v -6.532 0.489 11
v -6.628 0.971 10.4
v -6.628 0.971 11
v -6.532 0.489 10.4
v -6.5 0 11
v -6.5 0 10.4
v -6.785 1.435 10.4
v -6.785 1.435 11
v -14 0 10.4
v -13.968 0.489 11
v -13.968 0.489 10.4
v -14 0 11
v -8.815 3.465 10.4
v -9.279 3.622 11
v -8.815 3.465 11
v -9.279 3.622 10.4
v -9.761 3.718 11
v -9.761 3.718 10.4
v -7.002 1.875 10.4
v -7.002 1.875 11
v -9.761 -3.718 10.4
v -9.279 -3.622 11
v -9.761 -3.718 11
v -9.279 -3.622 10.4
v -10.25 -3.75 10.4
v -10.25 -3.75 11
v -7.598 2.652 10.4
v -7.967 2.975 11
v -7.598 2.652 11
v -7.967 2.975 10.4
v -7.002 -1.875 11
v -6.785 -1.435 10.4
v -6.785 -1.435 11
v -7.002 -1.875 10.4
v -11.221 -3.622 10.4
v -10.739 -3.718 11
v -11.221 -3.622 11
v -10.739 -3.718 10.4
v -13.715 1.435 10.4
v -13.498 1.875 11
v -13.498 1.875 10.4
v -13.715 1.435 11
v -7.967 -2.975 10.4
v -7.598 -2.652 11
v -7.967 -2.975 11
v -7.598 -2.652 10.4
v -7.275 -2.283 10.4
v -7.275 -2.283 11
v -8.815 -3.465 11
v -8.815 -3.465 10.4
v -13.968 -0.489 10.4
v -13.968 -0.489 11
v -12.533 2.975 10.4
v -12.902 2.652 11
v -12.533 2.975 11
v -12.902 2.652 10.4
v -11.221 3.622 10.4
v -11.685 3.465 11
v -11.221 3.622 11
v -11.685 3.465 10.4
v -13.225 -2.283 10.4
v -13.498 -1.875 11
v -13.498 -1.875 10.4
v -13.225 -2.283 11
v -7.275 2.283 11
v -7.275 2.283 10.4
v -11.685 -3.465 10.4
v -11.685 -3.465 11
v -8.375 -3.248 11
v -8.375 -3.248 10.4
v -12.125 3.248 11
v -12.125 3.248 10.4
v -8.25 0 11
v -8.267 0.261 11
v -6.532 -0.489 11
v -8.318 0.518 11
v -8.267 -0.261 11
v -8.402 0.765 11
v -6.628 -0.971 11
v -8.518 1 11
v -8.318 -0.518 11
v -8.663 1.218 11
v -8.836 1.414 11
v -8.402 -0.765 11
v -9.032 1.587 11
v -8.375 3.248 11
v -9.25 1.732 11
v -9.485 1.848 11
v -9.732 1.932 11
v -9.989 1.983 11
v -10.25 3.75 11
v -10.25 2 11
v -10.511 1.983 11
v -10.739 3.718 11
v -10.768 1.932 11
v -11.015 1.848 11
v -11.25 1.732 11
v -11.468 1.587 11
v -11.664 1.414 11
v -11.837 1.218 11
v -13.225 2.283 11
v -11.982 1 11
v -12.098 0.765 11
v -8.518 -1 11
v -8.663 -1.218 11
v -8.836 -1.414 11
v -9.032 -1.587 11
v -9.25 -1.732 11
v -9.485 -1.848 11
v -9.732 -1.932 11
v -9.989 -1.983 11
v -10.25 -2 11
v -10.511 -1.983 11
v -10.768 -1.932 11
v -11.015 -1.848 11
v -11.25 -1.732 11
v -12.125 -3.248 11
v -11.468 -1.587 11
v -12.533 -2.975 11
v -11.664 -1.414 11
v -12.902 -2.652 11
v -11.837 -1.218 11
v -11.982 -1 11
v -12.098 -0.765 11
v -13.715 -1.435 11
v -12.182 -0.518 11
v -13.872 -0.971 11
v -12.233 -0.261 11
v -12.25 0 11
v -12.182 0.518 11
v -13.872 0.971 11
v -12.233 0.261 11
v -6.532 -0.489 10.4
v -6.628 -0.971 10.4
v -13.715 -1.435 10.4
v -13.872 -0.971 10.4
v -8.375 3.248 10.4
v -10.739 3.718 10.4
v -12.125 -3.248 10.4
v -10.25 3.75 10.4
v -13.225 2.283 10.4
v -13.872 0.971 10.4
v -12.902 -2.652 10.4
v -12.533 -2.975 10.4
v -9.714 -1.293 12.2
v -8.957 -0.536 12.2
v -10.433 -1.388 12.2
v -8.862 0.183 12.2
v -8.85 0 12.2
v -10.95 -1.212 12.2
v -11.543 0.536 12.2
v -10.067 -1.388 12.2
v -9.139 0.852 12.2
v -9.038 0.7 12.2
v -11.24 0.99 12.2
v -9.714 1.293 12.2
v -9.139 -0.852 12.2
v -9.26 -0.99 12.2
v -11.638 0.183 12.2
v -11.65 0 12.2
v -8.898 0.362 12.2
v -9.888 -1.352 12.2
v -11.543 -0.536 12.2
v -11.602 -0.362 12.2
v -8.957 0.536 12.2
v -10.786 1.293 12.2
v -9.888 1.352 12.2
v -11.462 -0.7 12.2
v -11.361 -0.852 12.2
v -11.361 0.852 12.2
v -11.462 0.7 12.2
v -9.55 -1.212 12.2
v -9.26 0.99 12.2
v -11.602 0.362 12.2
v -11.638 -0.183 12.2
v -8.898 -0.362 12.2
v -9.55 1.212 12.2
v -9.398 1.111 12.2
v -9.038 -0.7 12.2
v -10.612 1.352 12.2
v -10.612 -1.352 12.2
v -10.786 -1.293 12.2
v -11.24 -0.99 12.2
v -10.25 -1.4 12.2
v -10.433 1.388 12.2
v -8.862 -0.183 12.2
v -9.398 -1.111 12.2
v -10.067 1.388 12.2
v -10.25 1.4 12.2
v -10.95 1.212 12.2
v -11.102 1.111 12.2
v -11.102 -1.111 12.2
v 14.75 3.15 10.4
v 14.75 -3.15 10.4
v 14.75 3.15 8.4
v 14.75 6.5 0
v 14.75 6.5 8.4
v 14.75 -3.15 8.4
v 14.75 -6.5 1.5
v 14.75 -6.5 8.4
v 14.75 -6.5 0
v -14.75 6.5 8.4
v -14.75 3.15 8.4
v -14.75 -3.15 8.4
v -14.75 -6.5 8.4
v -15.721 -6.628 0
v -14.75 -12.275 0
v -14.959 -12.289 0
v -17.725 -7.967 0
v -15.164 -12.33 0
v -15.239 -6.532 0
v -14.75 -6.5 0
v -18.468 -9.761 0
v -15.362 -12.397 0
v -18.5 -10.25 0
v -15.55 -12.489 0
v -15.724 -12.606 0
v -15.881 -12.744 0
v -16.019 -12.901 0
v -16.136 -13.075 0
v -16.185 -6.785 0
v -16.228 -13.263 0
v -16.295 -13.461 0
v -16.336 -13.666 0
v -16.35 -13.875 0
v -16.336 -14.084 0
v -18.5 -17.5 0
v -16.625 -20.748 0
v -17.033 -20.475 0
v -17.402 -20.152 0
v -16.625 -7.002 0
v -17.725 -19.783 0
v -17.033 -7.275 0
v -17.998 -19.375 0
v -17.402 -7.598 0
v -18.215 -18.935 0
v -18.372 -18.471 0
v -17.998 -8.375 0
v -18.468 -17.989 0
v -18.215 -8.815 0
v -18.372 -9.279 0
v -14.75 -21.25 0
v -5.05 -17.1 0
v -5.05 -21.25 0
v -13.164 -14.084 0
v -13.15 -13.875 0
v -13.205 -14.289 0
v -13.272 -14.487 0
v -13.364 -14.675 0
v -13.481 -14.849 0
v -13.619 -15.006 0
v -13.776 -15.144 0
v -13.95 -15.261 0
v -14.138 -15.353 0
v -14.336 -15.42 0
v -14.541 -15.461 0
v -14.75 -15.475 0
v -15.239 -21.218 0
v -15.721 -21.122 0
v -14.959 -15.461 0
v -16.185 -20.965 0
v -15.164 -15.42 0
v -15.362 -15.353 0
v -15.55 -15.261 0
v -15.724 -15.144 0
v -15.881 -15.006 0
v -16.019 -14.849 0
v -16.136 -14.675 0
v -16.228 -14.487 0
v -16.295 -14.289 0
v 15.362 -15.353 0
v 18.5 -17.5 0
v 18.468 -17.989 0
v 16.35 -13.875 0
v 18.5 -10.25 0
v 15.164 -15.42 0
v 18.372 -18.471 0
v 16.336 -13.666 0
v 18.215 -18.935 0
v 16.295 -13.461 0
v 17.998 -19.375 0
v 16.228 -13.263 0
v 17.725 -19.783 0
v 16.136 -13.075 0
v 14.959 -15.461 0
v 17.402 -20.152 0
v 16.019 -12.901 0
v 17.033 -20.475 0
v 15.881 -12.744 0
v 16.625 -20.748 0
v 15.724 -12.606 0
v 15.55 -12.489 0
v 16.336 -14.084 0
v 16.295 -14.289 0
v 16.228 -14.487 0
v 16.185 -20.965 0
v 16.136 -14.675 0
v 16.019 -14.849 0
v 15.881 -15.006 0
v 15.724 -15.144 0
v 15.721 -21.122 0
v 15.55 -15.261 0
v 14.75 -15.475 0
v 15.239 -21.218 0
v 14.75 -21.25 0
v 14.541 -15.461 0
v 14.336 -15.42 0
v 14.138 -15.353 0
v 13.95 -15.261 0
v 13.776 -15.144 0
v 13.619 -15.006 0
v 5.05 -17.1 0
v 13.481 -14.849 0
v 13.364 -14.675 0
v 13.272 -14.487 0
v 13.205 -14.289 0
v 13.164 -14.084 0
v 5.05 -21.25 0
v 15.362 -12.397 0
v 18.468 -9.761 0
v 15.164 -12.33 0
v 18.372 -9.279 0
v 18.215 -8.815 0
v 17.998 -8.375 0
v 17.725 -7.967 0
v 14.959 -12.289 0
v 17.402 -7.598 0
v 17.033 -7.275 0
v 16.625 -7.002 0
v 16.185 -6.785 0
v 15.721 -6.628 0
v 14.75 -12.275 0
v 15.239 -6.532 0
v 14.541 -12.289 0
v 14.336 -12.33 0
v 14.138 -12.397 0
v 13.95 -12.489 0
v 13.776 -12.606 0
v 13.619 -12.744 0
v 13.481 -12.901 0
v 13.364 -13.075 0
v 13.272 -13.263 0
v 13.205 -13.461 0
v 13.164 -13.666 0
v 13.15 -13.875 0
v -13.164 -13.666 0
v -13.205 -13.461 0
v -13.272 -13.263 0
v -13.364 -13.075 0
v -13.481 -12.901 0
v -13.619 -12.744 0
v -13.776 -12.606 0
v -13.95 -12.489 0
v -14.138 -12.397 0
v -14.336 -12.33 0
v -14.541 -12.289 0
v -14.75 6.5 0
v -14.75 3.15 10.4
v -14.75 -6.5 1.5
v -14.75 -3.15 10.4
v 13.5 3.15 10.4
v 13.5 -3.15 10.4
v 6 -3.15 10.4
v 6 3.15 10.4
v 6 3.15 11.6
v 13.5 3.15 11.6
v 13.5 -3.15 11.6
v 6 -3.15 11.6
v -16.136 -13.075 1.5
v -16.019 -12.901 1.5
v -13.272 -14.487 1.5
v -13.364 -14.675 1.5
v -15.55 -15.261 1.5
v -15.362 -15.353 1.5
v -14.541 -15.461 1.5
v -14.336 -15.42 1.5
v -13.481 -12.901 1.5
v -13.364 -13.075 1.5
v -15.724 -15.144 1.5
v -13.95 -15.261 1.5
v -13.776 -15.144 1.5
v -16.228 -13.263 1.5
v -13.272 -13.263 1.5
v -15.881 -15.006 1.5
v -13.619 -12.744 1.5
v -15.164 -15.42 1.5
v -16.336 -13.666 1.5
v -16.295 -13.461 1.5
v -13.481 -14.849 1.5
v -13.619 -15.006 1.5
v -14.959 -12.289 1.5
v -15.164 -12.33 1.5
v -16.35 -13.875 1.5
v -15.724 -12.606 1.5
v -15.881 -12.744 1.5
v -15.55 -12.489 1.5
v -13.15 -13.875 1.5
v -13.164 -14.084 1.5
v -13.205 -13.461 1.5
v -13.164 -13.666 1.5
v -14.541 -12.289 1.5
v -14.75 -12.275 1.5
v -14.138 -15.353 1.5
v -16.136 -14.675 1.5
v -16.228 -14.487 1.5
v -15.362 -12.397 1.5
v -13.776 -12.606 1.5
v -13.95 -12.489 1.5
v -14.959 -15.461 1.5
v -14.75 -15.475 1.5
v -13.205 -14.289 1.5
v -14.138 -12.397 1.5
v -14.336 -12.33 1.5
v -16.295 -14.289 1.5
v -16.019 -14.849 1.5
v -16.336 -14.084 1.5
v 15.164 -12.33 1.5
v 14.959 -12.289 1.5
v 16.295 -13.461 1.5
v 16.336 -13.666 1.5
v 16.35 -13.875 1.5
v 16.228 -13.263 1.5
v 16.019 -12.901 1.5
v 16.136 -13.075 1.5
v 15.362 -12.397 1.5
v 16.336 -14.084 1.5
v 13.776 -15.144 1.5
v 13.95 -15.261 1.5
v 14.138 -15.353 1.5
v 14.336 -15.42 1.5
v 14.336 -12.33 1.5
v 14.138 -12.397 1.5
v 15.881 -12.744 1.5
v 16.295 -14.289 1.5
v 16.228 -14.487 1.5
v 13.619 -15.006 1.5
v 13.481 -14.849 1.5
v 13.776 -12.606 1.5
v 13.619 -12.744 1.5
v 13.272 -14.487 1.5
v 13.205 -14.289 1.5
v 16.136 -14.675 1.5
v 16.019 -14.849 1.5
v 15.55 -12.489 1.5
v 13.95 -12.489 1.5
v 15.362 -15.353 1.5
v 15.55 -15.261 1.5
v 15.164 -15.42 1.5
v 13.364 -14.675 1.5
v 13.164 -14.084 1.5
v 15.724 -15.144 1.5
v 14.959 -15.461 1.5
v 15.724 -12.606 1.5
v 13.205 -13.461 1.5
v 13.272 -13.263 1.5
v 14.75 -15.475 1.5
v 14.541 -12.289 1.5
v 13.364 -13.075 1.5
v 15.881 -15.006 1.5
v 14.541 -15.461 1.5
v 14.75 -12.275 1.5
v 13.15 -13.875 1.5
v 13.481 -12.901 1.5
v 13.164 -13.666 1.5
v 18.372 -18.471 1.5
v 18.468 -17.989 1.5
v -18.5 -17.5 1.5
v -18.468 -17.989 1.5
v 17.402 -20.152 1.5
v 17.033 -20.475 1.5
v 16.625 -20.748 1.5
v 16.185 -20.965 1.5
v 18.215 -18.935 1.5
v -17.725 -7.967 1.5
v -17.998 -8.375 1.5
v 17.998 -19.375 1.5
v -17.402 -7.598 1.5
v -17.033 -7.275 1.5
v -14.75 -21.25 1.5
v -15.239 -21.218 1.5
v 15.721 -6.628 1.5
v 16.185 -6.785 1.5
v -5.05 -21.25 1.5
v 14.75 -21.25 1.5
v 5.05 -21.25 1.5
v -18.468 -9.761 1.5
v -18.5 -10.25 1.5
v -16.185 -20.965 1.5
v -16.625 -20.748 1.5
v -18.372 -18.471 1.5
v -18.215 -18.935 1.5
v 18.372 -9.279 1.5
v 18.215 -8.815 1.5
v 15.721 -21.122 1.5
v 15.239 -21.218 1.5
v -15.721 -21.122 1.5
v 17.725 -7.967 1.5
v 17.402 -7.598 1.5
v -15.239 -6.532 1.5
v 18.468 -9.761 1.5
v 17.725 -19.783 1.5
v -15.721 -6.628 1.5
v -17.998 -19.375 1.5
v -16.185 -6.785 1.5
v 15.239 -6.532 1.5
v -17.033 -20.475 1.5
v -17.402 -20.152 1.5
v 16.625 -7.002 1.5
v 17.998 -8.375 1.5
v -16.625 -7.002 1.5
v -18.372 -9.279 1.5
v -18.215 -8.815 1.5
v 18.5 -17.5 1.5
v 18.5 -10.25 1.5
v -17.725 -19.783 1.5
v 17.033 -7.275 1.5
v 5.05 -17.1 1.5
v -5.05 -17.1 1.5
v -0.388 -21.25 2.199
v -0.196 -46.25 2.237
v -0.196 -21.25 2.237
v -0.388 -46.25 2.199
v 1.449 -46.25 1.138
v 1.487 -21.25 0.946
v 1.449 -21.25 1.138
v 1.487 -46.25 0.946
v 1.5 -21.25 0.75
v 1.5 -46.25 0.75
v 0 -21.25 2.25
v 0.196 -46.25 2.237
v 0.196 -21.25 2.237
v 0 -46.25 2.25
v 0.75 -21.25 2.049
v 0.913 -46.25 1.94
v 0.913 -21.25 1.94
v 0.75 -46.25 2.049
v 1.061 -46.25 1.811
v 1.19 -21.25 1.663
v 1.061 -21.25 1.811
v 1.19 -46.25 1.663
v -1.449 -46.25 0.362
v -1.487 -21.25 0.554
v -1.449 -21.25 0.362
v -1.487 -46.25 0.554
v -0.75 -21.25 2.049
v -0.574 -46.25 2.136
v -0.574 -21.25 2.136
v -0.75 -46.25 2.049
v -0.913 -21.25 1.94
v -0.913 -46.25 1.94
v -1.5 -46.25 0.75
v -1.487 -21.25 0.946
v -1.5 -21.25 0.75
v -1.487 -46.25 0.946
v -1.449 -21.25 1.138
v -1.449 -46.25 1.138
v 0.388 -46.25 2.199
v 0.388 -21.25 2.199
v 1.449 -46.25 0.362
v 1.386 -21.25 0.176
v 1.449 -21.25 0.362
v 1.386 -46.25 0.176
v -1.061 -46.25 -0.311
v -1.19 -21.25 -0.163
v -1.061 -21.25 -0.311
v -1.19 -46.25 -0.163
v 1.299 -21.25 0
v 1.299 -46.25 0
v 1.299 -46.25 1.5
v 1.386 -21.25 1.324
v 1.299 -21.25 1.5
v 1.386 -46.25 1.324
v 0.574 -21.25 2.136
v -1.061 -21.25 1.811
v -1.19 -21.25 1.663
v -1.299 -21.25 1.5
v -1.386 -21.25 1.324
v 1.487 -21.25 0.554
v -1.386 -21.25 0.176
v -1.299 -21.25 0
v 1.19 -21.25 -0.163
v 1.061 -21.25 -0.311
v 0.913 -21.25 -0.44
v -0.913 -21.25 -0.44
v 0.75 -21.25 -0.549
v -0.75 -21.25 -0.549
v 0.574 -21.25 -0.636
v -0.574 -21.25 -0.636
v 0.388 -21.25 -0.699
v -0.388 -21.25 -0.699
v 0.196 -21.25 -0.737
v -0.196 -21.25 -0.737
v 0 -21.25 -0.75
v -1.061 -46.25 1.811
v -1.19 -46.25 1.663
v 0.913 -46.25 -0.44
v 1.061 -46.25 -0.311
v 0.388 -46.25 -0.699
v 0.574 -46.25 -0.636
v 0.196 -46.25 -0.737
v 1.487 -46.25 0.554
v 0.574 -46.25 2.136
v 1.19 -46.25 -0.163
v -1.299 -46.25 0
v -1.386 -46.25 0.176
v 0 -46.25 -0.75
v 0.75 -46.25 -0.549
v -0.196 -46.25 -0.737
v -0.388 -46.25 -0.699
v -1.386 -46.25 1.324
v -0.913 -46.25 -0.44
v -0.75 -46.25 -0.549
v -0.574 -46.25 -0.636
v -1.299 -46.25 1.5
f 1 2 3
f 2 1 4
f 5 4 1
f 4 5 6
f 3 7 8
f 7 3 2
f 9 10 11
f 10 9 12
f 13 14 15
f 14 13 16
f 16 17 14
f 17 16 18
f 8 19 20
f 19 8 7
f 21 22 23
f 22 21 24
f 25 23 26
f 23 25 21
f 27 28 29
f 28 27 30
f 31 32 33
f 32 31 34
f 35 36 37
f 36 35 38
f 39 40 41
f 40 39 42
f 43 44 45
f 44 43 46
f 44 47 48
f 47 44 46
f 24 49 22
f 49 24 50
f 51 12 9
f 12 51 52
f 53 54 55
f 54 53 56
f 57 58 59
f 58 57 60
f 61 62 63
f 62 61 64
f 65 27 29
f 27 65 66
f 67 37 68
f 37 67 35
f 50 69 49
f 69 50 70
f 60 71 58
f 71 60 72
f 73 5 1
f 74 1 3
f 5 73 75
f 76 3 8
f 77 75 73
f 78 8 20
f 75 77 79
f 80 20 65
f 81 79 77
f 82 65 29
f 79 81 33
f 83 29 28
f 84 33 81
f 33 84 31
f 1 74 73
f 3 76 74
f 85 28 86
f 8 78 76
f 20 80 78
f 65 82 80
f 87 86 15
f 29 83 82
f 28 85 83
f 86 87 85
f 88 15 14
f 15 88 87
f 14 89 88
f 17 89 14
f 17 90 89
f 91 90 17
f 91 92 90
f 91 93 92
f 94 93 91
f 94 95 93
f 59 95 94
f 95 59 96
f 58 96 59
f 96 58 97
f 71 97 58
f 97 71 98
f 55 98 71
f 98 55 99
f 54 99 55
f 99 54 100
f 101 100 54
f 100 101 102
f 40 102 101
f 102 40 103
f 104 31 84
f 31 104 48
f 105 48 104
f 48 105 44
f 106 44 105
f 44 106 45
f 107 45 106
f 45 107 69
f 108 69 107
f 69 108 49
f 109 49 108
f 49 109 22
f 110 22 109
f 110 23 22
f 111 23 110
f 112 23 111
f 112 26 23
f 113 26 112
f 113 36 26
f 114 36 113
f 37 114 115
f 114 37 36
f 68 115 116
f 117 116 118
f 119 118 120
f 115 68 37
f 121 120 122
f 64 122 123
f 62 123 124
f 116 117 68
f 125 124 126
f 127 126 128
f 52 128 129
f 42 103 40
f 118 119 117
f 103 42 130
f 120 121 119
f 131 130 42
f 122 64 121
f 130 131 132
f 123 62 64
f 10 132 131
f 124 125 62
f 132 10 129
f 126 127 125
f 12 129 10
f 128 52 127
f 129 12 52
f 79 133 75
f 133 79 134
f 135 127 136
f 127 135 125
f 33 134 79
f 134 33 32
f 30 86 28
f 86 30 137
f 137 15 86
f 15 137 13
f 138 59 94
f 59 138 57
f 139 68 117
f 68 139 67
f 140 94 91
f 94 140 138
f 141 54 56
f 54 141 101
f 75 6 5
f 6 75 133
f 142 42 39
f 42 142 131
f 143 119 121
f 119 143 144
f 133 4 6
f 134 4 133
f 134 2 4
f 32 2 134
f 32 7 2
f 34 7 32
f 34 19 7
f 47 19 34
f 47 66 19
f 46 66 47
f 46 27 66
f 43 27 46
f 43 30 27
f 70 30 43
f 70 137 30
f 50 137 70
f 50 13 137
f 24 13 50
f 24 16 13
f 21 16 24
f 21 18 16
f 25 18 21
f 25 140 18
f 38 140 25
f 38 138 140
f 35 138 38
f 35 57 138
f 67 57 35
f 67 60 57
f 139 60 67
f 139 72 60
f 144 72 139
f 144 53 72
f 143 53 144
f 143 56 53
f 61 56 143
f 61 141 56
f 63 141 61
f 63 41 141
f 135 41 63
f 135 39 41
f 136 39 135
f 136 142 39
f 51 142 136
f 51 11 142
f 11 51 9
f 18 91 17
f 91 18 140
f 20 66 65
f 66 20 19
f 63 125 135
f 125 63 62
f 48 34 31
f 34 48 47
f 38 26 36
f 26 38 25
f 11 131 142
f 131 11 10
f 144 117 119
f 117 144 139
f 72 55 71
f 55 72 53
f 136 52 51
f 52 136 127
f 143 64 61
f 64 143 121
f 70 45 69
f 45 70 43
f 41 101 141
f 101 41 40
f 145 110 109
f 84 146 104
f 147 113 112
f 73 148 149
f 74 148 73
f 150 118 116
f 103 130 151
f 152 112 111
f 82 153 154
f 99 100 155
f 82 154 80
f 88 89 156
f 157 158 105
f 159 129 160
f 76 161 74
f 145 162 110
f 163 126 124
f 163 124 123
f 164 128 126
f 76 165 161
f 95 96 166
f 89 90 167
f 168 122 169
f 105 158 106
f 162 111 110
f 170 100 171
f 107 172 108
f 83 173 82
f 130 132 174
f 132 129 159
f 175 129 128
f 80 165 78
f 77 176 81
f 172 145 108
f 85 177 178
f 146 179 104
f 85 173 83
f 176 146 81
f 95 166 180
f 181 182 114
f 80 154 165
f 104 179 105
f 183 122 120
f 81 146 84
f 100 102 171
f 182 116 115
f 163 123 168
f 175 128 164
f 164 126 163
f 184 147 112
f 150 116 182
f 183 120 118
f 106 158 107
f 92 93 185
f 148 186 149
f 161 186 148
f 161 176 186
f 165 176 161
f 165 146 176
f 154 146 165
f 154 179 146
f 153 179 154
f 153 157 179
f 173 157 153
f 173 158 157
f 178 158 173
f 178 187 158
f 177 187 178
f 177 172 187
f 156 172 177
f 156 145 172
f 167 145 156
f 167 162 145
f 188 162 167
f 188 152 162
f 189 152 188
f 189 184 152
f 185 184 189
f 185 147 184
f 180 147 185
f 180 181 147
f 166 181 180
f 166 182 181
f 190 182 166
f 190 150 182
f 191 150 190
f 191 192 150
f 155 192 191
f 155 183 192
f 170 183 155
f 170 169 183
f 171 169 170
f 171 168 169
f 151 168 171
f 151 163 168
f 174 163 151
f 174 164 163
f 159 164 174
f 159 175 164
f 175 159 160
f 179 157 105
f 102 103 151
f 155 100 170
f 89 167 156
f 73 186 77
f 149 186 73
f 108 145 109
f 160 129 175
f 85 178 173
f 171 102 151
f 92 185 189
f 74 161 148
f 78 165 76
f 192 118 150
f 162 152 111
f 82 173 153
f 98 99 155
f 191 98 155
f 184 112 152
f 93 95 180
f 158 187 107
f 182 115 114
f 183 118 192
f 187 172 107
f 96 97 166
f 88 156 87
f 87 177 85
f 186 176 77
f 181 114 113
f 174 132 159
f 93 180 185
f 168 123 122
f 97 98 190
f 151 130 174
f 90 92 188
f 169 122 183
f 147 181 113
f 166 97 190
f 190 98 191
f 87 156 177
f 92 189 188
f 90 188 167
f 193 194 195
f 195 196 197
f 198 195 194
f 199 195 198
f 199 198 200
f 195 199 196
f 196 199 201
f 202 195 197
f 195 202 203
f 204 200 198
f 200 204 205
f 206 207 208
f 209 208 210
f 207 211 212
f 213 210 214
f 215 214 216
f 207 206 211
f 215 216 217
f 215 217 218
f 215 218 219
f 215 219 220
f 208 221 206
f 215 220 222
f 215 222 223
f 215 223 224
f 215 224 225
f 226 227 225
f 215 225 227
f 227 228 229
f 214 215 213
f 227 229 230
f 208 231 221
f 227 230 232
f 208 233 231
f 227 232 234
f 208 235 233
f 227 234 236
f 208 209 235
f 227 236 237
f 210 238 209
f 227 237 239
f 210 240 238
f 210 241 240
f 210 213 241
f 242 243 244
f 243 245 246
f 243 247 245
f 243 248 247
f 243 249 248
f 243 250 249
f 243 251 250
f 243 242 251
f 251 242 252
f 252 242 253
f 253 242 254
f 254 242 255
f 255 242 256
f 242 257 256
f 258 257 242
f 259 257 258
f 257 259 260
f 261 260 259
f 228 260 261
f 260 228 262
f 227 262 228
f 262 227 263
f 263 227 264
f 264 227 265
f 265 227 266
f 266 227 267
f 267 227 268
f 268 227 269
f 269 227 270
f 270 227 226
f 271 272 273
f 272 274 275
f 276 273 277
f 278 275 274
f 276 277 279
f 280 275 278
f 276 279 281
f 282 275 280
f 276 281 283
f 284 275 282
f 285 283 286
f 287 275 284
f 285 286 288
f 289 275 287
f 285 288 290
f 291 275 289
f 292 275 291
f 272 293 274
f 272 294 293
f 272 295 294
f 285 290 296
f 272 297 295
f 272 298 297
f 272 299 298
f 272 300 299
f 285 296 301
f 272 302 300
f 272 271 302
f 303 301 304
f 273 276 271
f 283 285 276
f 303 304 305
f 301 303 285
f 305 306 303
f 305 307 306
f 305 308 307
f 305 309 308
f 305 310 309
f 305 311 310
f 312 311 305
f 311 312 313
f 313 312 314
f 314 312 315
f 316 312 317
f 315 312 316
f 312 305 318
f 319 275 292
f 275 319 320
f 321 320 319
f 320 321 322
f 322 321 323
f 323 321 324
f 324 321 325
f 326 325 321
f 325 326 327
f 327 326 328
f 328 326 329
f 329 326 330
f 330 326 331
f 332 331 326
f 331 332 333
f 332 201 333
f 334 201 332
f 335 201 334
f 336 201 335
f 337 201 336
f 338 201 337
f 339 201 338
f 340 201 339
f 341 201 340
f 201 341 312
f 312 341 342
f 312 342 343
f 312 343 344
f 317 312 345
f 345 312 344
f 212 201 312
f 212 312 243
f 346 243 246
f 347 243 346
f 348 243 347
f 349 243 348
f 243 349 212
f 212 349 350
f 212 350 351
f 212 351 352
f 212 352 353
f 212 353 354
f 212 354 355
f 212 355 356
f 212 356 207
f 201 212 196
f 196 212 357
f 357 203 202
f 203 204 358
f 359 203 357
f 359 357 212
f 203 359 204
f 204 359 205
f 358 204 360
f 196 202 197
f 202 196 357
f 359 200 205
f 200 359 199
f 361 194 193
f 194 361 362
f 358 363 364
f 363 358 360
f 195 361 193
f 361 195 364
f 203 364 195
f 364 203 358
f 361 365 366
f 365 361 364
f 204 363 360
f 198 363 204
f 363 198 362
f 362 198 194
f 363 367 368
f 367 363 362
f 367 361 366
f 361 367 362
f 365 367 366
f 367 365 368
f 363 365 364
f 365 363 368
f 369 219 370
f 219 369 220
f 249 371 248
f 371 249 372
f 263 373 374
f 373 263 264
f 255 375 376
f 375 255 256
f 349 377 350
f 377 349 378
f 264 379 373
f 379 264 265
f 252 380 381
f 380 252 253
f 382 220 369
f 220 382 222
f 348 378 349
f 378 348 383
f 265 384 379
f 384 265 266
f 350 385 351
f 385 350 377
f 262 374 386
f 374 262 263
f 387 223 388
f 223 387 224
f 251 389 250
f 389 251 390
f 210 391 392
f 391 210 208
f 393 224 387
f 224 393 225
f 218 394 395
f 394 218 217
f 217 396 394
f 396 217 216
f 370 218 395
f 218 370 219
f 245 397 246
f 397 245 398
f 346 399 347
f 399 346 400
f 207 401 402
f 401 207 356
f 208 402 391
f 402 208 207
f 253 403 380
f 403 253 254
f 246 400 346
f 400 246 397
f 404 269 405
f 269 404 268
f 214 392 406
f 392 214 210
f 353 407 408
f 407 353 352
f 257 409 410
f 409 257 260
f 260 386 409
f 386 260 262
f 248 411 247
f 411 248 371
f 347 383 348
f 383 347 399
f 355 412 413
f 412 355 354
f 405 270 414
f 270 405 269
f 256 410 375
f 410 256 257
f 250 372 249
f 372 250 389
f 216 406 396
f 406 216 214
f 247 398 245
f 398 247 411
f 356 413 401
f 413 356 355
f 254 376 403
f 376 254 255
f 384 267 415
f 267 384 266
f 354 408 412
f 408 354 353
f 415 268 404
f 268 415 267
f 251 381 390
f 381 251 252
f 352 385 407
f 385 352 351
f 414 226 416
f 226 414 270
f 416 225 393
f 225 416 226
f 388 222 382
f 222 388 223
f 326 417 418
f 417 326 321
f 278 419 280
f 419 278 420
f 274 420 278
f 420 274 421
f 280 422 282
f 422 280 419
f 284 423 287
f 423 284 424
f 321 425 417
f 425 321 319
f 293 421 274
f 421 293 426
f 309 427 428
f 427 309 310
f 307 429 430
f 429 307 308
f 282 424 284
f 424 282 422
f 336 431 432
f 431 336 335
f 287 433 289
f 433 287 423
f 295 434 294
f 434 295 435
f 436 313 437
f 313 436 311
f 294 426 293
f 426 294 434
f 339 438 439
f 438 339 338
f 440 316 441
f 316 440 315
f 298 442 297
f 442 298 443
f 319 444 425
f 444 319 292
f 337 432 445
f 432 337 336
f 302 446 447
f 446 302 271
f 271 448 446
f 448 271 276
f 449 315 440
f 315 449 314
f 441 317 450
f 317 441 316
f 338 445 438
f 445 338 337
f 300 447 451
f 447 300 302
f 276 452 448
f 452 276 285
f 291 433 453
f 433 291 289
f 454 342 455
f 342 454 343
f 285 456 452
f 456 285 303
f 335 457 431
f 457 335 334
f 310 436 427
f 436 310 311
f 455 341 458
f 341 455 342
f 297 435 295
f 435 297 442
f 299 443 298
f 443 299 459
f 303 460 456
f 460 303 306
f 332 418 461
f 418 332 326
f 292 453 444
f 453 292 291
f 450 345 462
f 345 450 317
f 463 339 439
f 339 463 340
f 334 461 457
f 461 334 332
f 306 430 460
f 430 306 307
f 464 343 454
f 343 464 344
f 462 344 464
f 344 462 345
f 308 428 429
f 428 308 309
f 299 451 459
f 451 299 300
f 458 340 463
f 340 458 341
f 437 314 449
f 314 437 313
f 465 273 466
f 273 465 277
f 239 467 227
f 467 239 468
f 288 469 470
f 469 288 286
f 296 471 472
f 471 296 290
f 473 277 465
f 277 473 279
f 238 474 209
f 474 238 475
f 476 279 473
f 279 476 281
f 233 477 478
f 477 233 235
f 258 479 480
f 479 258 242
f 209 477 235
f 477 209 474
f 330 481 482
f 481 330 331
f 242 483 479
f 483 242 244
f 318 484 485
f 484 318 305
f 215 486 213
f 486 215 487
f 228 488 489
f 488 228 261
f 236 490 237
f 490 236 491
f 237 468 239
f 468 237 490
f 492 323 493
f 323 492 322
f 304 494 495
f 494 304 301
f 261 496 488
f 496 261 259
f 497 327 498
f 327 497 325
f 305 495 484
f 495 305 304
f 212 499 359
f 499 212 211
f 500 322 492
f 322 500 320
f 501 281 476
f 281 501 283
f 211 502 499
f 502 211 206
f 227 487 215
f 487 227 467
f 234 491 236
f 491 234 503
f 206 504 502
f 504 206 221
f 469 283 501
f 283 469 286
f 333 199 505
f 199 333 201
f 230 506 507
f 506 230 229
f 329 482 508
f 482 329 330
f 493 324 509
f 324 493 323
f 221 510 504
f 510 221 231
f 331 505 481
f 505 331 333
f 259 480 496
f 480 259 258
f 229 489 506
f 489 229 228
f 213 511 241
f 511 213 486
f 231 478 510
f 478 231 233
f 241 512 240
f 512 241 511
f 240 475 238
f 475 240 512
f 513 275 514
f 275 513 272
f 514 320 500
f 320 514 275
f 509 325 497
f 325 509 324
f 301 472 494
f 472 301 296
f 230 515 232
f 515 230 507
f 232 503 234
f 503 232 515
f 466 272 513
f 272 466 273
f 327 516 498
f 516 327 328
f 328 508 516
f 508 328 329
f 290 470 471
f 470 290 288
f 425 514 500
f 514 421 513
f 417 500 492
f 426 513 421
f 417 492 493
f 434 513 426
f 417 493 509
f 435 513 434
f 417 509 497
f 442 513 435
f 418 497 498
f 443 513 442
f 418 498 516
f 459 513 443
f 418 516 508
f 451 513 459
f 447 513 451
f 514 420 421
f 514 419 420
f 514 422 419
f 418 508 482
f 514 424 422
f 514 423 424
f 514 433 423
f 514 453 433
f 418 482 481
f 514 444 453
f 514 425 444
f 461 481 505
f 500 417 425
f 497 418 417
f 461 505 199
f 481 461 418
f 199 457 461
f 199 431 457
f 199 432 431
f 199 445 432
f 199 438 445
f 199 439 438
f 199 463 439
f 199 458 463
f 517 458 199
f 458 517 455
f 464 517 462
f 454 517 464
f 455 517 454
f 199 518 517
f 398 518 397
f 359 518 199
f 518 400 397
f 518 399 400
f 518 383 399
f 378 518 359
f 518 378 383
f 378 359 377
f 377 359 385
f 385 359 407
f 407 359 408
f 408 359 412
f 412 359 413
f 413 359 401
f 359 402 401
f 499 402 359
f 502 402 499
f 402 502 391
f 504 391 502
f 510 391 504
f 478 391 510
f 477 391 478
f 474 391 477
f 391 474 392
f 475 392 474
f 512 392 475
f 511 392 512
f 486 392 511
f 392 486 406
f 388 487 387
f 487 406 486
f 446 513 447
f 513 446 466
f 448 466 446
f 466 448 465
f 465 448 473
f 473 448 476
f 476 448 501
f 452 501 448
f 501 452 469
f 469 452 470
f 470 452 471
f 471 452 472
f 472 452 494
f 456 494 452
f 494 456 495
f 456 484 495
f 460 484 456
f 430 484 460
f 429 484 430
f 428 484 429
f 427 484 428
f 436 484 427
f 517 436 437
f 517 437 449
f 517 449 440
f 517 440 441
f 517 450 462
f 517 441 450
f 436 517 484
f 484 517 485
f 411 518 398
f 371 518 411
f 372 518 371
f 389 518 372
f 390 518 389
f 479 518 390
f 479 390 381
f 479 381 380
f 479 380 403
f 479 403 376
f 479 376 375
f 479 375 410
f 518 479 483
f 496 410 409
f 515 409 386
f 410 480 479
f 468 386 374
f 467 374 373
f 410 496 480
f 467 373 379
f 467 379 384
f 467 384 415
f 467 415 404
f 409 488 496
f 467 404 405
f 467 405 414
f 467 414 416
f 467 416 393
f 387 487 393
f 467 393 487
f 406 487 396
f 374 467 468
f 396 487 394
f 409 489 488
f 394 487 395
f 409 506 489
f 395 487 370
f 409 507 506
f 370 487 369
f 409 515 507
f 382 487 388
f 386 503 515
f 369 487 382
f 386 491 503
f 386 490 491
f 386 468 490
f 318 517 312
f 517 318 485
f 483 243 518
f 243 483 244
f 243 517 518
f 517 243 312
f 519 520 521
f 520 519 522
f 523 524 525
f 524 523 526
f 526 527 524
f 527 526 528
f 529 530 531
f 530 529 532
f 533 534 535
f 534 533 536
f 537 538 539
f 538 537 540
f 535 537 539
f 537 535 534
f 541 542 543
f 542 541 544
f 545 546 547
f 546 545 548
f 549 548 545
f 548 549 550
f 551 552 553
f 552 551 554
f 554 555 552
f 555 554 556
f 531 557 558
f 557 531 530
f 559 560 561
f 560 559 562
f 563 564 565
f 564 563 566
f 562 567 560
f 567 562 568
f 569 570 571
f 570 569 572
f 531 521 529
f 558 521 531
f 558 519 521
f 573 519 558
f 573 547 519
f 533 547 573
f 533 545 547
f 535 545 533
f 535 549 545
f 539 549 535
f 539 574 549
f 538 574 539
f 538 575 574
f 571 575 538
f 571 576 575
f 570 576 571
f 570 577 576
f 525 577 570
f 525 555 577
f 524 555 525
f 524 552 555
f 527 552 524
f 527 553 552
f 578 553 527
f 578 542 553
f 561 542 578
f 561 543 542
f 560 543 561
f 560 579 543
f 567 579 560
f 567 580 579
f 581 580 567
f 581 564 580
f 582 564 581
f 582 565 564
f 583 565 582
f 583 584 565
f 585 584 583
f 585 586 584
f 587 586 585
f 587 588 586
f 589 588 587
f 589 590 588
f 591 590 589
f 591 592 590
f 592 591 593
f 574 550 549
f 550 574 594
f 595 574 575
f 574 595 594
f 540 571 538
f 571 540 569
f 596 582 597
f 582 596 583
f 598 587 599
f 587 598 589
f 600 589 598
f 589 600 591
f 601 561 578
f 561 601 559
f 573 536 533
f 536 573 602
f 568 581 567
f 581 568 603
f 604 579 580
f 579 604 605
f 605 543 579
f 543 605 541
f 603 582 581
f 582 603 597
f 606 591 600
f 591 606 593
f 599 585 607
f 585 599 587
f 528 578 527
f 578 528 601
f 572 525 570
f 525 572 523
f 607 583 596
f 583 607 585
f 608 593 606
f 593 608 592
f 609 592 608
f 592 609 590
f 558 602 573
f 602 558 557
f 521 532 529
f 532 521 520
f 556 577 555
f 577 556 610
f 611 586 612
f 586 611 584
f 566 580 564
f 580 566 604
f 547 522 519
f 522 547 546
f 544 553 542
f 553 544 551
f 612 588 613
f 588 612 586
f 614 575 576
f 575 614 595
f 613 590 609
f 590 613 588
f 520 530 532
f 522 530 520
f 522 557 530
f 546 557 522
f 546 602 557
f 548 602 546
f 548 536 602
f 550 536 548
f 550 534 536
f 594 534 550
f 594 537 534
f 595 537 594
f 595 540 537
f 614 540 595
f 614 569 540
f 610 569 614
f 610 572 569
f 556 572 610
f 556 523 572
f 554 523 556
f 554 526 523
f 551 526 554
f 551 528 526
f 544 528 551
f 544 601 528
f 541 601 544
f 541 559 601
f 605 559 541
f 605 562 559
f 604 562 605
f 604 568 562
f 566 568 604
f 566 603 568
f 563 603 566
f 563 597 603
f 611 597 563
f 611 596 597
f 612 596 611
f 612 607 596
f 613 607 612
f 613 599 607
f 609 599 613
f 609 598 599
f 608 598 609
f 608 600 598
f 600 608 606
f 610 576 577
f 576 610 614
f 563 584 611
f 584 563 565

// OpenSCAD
// ============================================================
// SHARP GP2Y0A21YK0F  距離センサ 外形モデル (近似)
// データシート 2 ページ目 "Outline Dimensions" を基にモデリング
// 単位: mm  /  座標系: 中心が原点, +Z 上方向(レンズ上面), +Y 前方
// 未指定寸法許容差 ±0.3mm (本モデルでは考慮せず概形のみ表現)
// ============================================================

$fn = 48;

// ------- データシート記載値 -------
overall_w      = 37;      // 本体+取付耳 全幅
lens_block_w   = 29.5;    // レンズケース部 幅
ear_w          = (overall_w - lens_block_w) / 2; // 3.75 (取付耳の張り出し)
lens_block_d   = 13;      // レンズケース部 奥行(側面図 13 を奥行に割当)
lens_block_h   = 8.4;     // レンズケース部 高さ(リブ手前まで)

ridge_d        = 6.3;     // 上部レンズ収容リブ 奥行
ridge_h        = 2;       // 上部レンズ収容リブ 高さ

tab_r          = 3.75;    // 取付耳 丸め半径 (R3.75)
hole_d         = 3.2;     // 取付穴 直径 (φ3.2 x2)

emitter_x      = -14.75 + 4.5;    // *4.5  -> -10.25 (発光レンズ中心)
detector_x     = emitter_x + 20;  // *20±0.1 -> 9.75 (受光レンズ中心)

emitter_bezel_r = 3.75;   // 発光レンズ外枠半径 (R3.75)
emitter_lens_r  = 2.0;    // 発光レンズ ドーム半径
detector_w      = 7.5;    // 受光レンズ窓 幅(近似)
detector_d      = 6.3;    // 受光レンズ窓 奥行(リブ幅に合わせる)

bar_extra_d    = 14.75;   // 連結バー 延長長さ(近似)
bar_h          = 1.5;     // 連結バー(薄板)厚み ("2-1.5" のステップ相当)
notch_w        = 10.1;    // ケーブル取り出し切欠き 幅
notch_d        = 4.15;    // ケーブル取り出し切欠き 深さ

cable_r        = 1.5;     // 簡易ケーブル 半径
cable_len      = 25;      // 簡易ケーブル 長さ

// ------- 派生位置 -------
lens_block_y0  = -lens_block_d / 2;            // レンズ部 後端
lens_block_y1  =  lens_block_d / 2;            // レンズ部 前端
bar_y0         = lens_block_y0 - bar_extra_d;  // 連結バー 後端(外側)
bar_y1         = lens_block_y0;                // 連結バー がレンズ部と接する位置
bar_yc         = (bar_y0 + bar_y1) / 2;        // 連結バー 中心Y

// ------- 部品モジュール -------

// 丸端(左右)長方形プレート
module rounded_plate(w, d, r, h) {
    hull() {
        translate([-w/2 + r, -d/2 + r, 0]) cylinder(r = r, h = h);
        translate([ w/2 - r, -d/2 + r, 0]) cylinder(r = r, h = h);
        translate([-w/2 + r,  d/2 - r, 0]) cylinder(r = r, h = h);
        translate([ w/2 - r,  d/2 - r, 0]) cylinder(r = r, h = h);
    }
}

// 連結バー: 取付穴2つ + ケーブル取り出し切欠き
module connecting_bar() {
    difference() {
        translate([0, bar_yc, 0])
            rounded_plate(overall_w, bar_extra_d, tab_r, bar_h);

        // 取付穴 x2 (左右の丸耳内)
        for (sx = [-1, 1]) {
            translate([sx * (overall_w/2 - tab_r), bar_yc, -1])
                cylinder(d = hole_d, h = bar_h + 2);
        }

        // ケーブル取り出し切欠き(後端から内側へ)
        translate([-notch_w/2, bar_y0 - 1, -1])
            cube([notch_w, notch_d + 1, bar_h + 2]);
    }
}

// レンズ部本体ケース + 発光/受光レンズ
module lens_case() {
    union() {
        // 本体ケース(直方体)
        translate([-lens_block_w/2, lens_block_y0, 0])
            cube([lens_block_w, lens_block_d, lens_block_h]);

        // 上部レンズ収容リブ
        translate([-lens_block_w/2, -ridge_d/2, lens_block_h])
            cube([lens_block_w, ridge_d, ridge_h]);

        // 発光側レンズ(円形の窓+ドーム)
        translate([emitter_x, 0, lens_block_h + ridge_h]) {
            cylinder(r = emitter_bezel_r, h = 0.6);
            translate([0, 0, 0.6])
                cylinder(r1 = emitter_lens_r, r2 = emitter_lens_r * 0.7, h = 1.2);
        }

        // 受光側レンズ(矩形の窓)
        translate([detector_x - detector_w/2, -detector_d/2, lens_block_h + ridge_h])
            cube([detector_w, detector_d, 1.2]);
    }
}

// 簡易ケーブル(丸棒表現)
module cable() {
    translate([0, bar_y0, bar_h/2])
        rotate([90, 0, 0])
            cylinder(r = cable_r, h = cable_len);
}

// ------- 全体組み立て -------
module sensor() {
    union() {
        lens_case();
        connecting_bar();
        cable();
    }
}

sensor();
